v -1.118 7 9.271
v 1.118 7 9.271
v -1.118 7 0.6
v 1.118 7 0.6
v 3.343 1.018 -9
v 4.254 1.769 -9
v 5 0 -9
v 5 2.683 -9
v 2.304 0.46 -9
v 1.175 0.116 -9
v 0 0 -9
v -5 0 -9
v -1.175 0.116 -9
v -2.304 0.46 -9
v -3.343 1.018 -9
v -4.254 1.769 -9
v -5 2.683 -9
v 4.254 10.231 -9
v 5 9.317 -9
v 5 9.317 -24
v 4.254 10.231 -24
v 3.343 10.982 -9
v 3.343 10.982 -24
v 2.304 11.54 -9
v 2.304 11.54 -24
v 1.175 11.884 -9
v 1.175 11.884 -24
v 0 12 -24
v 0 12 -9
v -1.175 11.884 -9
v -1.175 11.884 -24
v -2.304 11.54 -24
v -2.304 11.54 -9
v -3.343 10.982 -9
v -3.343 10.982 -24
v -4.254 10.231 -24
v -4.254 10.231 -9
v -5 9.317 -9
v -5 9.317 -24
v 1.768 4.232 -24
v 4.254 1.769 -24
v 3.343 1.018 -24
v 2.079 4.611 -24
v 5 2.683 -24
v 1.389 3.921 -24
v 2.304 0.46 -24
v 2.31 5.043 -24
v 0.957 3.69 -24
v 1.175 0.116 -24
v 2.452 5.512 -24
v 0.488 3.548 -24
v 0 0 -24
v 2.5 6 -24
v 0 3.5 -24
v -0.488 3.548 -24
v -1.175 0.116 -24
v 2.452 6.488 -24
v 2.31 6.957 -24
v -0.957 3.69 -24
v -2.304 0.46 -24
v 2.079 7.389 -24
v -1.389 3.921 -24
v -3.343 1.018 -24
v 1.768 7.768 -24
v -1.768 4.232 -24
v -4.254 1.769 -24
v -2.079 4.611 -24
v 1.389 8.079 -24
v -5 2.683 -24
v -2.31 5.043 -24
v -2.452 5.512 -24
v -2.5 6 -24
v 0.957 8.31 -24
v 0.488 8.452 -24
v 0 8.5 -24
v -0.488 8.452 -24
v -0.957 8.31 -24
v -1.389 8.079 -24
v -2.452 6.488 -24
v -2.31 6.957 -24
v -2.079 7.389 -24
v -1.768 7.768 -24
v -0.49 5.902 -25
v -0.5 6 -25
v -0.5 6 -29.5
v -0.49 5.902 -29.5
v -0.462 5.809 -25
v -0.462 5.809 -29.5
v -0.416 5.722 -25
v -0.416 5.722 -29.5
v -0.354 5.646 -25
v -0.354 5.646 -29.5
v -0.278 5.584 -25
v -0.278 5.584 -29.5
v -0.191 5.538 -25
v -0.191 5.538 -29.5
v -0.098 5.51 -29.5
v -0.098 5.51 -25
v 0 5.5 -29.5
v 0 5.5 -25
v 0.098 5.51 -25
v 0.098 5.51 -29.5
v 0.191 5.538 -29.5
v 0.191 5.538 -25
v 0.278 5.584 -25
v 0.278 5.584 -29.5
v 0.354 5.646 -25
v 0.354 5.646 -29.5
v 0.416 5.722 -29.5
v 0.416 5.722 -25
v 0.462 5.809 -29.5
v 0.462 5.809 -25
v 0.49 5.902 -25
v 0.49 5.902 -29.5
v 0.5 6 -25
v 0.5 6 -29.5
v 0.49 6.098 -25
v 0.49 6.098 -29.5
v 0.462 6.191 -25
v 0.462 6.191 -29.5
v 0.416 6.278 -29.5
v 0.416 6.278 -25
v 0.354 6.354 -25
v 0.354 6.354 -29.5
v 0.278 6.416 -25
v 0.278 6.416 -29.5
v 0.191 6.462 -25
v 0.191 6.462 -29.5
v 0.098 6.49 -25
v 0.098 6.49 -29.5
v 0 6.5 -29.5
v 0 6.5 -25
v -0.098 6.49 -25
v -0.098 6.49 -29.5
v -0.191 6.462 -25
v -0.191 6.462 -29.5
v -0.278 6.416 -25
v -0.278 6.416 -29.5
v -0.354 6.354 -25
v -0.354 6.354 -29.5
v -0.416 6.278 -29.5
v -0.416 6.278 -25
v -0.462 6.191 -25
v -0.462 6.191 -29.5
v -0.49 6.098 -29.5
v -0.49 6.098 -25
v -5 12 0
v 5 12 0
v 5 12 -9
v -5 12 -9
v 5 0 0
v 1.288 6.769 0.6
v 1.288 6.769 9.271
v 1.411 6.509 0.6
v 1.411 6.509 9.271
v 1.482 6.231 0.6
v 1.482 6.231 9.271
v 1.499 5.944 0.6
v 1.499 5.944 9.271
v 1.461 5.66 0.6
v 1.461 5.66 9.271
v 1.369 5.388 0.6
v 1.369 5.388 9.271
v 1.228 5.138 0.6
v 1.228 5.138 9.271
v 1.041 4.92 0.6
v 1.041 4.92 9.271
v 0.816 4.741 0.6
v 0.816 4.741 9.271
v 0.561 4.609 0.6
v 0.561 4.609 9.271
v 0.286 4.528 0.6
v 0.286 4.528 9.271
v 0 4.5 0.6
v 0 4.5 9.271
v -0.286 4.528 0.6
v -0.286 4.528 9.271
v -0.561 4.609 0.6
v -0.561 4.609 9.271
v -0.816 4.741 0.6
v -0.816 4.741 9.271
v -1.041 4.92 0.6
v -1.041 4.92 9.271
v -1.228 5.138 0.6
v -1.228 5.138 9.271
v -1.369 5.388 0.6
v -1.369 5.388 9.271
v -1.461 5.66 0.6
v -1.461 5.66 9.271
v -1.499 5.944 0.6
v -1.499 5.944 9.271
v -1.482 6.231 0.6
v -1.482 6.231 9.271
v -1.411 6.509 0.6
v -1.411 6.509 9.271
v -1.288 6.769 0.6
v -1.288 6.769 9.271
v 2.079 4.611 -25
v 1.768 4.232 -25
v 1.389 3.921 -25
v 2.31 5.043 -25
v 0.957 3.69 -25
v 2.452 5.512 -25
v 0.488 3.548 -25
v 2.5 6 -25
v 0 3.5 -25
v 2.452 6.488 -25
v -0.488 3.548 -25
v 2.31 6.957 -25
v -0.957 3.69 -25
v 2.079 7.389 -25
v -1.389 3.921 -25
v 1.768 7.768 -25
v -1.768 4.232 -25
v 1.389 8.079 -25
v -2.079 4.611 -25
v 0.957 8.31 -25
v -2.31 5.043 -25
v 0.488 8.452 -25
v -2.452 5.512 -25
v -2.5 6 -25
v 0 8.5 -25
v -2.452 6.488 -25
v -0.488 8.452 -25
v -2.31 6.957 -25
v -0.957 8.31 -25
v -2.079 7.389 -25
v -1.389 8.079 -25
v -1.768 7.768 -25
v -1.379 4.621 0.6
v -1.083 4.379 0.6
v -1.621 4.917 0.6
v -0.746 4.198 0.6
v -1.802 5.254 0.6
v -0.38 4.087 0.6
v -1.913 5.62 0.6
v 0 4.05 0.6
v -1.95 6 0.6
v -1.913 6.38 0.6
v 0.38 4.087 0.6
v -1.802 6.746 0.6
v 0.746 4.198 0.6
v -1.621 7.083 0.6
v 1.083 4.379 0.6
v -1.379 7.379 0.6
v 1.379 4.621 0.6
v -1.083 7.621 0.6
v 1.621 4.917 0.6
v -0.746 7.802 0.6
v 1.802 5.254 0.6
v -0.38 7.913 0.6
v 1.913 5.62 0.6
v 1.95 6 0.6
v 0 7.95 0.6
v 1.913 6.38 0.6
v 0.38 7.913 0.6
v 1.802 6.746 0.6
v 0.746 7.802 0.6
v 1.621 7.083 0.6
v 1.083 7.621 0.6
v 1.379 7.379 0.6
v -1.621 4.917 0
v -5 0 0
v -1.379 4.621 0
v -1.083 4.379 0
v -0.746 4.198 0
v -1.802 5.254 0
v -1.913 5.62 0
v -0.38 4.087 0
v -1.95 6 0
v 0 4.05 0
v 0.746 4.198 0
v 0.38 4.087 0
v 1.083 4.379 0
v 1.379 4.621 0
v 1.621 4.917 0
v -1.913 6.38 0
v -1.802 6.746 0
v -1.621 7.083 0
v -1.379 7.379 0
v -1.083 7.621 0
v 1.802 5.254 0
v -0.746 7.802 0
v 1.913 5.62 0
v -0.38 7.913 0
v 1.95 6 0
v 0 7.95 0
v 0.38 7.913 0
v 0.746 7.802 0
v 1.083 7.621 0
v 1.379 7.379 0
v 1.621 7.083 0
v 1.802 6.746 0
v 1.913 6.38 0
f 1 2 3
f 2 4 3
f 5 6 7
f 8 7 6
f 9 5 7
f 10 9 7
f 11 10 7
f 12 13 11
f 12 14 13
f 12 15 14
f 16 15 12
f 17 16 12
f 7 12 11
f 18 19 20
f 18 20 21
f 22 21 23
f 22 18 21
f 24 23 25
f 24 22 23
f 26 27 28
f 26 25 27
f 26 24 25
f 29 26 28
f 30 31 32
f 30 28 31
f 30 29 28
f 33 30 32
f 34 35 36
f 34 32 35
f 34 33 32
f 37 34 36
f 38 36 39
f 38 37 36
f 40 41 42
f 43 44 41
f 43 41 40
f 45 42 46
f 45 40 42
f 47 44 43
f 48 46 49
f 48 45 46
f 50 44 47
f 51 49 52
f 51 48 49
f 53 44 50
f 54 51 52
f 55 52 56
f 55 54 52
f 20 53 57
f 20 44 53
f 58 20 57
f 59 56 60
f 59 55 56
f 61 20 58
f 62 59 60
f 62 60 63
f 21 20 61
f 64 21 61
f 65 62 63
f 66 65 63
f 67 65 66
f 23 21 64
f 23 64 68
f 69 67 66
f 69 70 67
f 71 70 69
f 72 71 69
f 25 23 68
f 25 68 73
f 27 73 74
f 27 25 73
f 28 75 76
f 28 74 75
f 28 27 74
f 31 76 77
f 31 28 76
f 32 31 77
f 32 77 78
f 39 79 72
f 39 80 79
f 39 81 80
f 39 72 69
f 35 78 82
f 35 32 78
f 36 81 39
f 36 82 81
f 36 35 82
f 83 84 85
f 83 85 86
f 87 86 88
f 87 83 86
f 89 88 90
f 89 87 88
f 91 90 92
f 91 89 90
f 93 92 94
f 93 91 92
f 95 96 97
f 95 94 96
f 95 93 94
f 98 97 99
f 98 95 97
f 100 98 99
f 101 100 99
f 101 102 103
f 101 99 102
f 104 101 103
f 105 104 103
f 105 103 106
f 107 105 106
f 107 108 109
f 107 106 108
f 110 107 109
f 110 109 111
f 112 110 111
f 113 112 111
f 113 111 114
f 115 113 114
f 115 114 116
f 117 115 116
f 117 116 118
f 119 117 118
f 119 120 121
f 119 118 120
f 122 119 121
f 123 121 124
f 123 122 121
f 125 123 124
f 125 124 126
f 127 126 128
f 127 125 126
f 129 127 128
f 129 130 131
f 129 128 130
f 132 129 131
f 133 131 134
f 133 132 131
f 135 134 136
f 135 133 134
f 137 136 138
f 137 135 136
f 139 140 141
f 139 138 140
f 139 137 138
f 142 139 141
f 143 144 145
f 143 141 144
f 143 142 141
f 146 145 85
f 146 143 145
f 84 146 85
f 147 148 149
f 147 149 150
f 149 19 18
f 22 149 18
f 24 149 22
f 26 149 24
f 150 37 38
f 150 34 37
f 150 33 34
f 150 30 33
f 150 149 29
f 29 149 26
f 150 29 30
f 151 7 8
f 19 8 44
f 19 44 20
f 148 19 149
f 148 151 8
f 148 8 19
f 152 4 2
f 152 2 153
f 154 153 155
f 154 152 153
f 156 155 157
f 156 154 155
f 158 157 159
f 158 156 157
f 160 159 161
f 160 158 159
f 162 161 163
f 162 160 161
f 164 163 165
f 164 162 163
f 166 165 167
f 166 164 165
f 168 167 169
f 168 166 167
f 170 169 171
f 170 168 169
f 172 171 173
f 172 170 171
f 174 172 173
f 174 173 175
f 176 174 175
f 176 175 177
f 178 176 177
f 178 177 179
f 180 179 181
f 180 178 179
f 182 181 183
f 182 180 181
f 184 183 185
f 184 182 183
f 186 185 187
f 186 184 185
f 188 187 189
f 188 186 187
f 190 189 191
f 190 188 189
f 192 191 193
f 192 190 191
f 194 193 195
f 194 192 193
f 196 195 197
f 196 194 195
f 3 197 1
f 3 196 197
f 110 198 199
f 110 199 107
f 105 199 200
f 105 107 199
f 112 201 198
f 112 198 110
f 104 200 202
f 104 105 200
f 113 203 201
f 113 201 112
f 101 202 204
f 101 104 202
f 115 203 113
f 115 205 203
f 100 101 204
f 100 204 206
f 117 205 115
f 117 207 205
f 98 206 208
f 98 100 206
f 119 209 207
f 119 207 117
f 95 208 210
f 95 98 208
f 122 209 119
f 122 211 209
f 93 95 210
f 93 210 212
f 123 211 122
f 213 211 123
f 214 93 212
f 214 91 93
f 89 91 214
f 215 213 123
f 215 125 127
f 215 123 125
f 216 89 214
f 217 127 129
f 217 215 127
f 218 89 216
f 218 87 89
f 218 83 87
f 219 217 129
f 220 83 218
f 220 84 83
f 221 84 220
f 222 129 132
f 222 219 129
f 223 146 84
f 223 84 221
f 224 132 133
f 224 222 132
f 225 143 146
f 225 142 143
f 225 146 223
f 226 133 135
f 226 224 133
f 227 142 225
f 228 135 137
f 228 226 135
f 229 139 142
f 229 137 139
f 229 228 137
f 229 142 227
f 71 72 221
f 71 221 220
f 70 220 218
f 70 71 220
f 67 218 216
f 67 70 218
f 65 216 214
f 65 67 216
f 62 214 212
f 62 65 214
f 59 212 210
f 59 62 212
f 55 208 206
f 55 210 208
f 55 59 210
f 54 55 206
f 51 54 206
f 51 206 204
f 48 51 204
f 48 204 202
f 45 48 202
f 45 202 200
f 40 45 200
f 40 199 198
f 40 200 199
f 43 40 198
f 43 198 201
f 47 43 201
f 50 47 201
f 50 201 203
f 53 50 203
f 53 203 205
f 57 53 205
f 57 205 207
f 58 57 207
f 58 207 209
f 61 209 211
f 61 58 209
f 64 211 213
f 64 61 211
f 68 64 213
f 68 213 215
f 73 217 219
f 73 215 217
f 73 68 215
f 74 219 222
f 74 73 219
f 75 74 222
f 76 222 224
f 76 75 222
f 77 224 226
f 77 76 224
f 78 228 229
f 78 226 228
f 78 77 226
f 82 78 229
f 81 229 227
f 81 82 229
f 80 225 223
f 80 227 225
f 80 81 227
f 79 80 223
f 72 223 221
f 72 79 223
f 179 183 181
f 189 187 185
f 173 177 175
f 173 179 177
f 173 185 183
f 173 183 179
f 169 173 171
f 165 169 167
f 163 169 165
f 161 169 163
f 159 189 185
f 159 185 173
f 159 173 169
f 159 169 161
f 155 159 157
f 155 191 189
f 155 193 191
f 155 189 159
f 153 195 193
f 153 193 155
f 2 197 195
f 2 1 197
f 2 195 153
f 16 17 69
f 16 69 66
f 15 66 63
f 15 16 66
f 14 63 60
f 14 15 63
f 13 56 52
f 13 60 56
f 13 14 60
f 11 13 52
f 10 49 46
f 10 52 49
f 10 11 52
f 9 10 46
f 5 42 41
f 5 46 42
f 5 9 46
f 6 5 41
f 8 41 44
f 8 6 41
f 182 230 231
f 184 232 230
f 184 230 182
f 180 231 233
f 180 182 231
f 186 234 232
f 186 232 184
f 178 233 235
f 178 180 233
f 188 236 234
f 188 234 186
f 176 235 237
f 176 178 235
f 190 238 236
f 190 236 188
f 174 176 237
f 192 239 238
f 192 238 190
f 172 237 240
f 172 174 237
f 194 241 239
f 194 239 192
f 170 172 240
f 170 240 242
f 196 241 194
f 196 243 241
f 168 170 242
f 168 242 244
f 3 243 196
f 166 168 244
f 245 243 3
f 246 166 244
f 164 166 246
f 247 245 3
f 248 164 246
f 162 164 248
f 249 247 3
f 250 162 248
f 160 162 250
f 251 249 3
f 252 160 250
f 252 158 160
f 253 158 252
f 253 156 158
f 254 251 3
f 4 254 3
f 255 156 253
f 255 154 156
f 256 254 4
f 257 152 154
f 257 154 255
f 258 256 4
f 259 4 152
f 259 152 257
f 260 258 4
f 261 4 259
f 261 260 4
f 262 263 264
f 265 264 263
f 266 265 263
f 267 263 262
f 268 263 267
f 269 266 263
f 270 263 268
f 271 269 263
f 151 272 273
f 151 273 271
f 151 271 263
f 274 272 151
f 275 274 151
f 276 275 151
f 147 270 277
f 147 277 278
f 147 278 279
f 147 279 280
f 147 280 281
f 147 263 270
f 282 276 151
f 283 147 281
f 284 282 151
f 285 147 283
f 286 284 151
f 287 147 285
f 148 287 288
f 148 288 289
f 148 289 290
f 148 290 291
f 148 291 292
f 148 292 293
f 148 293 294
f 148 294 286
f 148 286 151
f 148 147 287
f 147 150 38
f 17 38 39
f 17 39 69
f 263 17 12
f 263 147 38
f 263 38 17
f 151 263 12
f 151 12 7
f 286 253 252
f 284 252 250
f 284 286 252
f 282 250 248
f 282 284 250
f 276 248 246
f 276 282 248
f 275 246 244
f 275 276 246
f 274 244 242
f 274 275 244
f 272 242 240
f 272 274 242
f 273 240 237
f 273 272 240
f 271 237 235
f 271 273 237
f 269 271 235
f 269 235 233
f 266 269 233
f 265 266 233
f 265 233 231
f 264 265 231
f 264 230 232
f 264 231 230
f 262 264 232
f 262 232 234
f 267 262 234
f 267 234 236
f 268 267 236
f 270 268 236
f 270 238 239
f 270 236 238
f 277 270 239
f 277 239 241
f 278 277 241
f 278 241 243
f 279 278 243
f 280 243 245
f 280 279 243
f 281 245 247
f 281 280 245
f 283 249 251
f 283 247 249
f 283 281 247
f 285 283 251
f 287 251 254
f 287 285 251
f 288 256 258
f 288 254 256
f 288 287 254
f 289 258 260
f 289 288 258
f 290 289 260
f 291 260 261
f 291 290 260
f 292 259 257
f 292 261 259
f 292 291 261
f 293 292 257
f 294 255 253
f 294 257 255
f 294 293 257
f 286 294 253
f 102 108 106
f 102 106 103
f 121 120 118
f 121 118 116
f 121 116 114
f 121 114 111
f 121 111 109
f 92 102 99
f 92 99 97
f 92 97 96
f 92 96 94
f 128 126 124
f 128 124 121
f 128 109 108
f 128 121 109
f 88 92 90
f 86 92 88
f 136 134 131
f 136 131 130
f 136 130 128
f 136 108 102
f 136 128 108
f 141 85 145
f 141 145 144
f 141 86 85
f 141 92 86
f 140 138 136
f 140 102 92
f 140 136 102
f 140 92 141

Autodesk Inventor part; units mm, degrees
ref_plane "YZ Plane" through (0, 0, 0) normal (1, 0, 0) x (0, 1, 0)
ref_plane "XZ Plane" through (0, 0, 0) normal (0, 1, 0) x (-1, 0, 0)
ref_plane "XY Plane" through (0, 0, 0) normal (0, 0, 1) x (1, 0, 0)
sketch "Sketch1" plane through (0, 0, 0) normal (0, 0, 1) x (1, 0, 0)
  line L0 (-5, 0) -> (5, 0)
  line L1 (5, 0) -> (5, 12)
  line L2 (5, 12) -> (-5, 12)
  line L3 (-5, 12) -> (-5, 0)
  arc A0 (-1.118, 7) -> (1.118, 7) centre (0, 6) ccw
  line L4 (0, 7) -> (-1.118, 7)
  line L5 (-1.118, 7) -> (1.118, 7)
  circle A1 centre (0, 6) radius 1.5
  circle A2 centre (0, 6) radius 1.95
  point P0 (0, 0)
  dimension "d0" = 10
  dimension "d1" = 12
extrude "Extrusion1" add sketch "Sketch1" along normal blind 9.271 contours L4 L5 A0
extrude "Extrusion2" add sketch "Sketch1" along normal blind 0.6 contours A2
extrude "Extrusion3" add sketch "Sketch1" along normal blind 0.6 contours A1 L5 L4
sketch "Sketch2" plane through (0, 6, 0) normal (0, 0, -1) x (-1, 0, 0)
  circle A0 centre (0, 0) radius 1.95 projected
  point P0 (0, -6)
extrude "Extrusion4" add sketch "Sketch1" against normal blind 9 contours L3 L2 L1 L0
extrude "Extrusion5" add sketch "Sketch2" along normal blind 9
sketch "Sketch4" plane through (0, 0, -9) normal (0, 0, -1) x (-1, 0, 0)
  line L0 (5, 9.3166) -> (5, 2.6834)
  line L1 (-5, 2.6834) -> (-5, 9.3166)
  arc A0 (5, 9.3166) -> (-5, 9.3166) centre (0, 6) ccw
  arc A1 (-5, 2.6834) -> (5, 2.6834) centre (0, 6) ccw
  point P0 (0, 0)
extrude "Extrusion6" add sketch "Sketch4" along normal blind 15
sketch "Sketch5" plane through (0, 0, -24) normal (0, 0, -1) x (-1, 0, 0)
  circle A0 centre (0, 6) radius 2.5
  circle A1 centre (0, 6) radius 0.5
  point P0 (0, 0)
extrude "Extrusion7" add sketch "Sketch5" along normal blind 1
extrude "Extrusion8" add sketch "Sketch5" along normal blind 5.5 contours A1
sketch "Sketch6" plane through (-5, 0, 0) normal (0, -1, 0) x (1, 0, 0)
  line L0 (0, 0) -> (10, 0) projected
  line L1 (0, 0) -> (0, -9) projected
  line L2 (5, -9) -> (0, -9) projected
  line L3 (10, -9) -> (5, -9) projected
  line L4 (10, 0) -> (10, -9) projected
  line L5 (5, -9) -> (10, -9) projected
  line L6 (0, -9) -> (5, -9) projected
  line L7 (0, -9) -> (0, -24) projected
  line L8 (10, -24) -> (0, -24) projected
  line L9 (10, -9) -> (10, -24) projected
  line L10 (0, 0) -> (10, 0) projected
  line L11 (0, 0) -> (0, -9) projected
  line L12 (5, -9) -> (0, -9) projected
  line L13 (10, -9) -> (5, -9) projected
  line L14 (10, 0) -> (10, -9) projected
  line L15 (3.882, 0.6) -> (6.118, 0.6) projected
  line L16 (6.118, 0.6) -> (6.118, 9.271) projected
  line L17 (3.882, 9.271) -> (6.118, 9.271) projected
  line L18 (3.882, 0.6) -> (3.882, 9.271) projected
  line L19 (6.95, 0.6) -> (3.05, 0.6) projected
  line L20 (3.5, 0.6) -> (3.5, 9.271) projected
  line L21 (4.5, -29.5) -> (5.5, -29.5) projected
  line L22 (5.5, -25) -> (4.5, -25) projected
  line L23 (2.5, -25) -> (7.5, -25) projected
  line L24 (7.5, -24) -> (2.5, -24) projected
  line L25 (5.5, -25) -> (5.5, -29.5) projected
  line L26 (4.5, -25) -> (4.5, -29.5) projected
  line L27 (2.5, -24) -> (2.5, -25) projected
  line L28 (2.5, -25) -> (7.5, -25) projected
  line L29 (7.5, -24) -> (7.5, -25) projected
  line L30 (6.5, 0.6) -> (6.5, 9.271) projected
  line L31 (6.95, 0) -> (6.95, 0.6) projected
  line L32 (3.05, 0) -> (3.05, 0.6) projected
  line L33 (6.5, 9.271) -> (3.5, 9.271) projected
  point P0 (5, 0)
properties part number "Motors" material "Stainless Steel"
